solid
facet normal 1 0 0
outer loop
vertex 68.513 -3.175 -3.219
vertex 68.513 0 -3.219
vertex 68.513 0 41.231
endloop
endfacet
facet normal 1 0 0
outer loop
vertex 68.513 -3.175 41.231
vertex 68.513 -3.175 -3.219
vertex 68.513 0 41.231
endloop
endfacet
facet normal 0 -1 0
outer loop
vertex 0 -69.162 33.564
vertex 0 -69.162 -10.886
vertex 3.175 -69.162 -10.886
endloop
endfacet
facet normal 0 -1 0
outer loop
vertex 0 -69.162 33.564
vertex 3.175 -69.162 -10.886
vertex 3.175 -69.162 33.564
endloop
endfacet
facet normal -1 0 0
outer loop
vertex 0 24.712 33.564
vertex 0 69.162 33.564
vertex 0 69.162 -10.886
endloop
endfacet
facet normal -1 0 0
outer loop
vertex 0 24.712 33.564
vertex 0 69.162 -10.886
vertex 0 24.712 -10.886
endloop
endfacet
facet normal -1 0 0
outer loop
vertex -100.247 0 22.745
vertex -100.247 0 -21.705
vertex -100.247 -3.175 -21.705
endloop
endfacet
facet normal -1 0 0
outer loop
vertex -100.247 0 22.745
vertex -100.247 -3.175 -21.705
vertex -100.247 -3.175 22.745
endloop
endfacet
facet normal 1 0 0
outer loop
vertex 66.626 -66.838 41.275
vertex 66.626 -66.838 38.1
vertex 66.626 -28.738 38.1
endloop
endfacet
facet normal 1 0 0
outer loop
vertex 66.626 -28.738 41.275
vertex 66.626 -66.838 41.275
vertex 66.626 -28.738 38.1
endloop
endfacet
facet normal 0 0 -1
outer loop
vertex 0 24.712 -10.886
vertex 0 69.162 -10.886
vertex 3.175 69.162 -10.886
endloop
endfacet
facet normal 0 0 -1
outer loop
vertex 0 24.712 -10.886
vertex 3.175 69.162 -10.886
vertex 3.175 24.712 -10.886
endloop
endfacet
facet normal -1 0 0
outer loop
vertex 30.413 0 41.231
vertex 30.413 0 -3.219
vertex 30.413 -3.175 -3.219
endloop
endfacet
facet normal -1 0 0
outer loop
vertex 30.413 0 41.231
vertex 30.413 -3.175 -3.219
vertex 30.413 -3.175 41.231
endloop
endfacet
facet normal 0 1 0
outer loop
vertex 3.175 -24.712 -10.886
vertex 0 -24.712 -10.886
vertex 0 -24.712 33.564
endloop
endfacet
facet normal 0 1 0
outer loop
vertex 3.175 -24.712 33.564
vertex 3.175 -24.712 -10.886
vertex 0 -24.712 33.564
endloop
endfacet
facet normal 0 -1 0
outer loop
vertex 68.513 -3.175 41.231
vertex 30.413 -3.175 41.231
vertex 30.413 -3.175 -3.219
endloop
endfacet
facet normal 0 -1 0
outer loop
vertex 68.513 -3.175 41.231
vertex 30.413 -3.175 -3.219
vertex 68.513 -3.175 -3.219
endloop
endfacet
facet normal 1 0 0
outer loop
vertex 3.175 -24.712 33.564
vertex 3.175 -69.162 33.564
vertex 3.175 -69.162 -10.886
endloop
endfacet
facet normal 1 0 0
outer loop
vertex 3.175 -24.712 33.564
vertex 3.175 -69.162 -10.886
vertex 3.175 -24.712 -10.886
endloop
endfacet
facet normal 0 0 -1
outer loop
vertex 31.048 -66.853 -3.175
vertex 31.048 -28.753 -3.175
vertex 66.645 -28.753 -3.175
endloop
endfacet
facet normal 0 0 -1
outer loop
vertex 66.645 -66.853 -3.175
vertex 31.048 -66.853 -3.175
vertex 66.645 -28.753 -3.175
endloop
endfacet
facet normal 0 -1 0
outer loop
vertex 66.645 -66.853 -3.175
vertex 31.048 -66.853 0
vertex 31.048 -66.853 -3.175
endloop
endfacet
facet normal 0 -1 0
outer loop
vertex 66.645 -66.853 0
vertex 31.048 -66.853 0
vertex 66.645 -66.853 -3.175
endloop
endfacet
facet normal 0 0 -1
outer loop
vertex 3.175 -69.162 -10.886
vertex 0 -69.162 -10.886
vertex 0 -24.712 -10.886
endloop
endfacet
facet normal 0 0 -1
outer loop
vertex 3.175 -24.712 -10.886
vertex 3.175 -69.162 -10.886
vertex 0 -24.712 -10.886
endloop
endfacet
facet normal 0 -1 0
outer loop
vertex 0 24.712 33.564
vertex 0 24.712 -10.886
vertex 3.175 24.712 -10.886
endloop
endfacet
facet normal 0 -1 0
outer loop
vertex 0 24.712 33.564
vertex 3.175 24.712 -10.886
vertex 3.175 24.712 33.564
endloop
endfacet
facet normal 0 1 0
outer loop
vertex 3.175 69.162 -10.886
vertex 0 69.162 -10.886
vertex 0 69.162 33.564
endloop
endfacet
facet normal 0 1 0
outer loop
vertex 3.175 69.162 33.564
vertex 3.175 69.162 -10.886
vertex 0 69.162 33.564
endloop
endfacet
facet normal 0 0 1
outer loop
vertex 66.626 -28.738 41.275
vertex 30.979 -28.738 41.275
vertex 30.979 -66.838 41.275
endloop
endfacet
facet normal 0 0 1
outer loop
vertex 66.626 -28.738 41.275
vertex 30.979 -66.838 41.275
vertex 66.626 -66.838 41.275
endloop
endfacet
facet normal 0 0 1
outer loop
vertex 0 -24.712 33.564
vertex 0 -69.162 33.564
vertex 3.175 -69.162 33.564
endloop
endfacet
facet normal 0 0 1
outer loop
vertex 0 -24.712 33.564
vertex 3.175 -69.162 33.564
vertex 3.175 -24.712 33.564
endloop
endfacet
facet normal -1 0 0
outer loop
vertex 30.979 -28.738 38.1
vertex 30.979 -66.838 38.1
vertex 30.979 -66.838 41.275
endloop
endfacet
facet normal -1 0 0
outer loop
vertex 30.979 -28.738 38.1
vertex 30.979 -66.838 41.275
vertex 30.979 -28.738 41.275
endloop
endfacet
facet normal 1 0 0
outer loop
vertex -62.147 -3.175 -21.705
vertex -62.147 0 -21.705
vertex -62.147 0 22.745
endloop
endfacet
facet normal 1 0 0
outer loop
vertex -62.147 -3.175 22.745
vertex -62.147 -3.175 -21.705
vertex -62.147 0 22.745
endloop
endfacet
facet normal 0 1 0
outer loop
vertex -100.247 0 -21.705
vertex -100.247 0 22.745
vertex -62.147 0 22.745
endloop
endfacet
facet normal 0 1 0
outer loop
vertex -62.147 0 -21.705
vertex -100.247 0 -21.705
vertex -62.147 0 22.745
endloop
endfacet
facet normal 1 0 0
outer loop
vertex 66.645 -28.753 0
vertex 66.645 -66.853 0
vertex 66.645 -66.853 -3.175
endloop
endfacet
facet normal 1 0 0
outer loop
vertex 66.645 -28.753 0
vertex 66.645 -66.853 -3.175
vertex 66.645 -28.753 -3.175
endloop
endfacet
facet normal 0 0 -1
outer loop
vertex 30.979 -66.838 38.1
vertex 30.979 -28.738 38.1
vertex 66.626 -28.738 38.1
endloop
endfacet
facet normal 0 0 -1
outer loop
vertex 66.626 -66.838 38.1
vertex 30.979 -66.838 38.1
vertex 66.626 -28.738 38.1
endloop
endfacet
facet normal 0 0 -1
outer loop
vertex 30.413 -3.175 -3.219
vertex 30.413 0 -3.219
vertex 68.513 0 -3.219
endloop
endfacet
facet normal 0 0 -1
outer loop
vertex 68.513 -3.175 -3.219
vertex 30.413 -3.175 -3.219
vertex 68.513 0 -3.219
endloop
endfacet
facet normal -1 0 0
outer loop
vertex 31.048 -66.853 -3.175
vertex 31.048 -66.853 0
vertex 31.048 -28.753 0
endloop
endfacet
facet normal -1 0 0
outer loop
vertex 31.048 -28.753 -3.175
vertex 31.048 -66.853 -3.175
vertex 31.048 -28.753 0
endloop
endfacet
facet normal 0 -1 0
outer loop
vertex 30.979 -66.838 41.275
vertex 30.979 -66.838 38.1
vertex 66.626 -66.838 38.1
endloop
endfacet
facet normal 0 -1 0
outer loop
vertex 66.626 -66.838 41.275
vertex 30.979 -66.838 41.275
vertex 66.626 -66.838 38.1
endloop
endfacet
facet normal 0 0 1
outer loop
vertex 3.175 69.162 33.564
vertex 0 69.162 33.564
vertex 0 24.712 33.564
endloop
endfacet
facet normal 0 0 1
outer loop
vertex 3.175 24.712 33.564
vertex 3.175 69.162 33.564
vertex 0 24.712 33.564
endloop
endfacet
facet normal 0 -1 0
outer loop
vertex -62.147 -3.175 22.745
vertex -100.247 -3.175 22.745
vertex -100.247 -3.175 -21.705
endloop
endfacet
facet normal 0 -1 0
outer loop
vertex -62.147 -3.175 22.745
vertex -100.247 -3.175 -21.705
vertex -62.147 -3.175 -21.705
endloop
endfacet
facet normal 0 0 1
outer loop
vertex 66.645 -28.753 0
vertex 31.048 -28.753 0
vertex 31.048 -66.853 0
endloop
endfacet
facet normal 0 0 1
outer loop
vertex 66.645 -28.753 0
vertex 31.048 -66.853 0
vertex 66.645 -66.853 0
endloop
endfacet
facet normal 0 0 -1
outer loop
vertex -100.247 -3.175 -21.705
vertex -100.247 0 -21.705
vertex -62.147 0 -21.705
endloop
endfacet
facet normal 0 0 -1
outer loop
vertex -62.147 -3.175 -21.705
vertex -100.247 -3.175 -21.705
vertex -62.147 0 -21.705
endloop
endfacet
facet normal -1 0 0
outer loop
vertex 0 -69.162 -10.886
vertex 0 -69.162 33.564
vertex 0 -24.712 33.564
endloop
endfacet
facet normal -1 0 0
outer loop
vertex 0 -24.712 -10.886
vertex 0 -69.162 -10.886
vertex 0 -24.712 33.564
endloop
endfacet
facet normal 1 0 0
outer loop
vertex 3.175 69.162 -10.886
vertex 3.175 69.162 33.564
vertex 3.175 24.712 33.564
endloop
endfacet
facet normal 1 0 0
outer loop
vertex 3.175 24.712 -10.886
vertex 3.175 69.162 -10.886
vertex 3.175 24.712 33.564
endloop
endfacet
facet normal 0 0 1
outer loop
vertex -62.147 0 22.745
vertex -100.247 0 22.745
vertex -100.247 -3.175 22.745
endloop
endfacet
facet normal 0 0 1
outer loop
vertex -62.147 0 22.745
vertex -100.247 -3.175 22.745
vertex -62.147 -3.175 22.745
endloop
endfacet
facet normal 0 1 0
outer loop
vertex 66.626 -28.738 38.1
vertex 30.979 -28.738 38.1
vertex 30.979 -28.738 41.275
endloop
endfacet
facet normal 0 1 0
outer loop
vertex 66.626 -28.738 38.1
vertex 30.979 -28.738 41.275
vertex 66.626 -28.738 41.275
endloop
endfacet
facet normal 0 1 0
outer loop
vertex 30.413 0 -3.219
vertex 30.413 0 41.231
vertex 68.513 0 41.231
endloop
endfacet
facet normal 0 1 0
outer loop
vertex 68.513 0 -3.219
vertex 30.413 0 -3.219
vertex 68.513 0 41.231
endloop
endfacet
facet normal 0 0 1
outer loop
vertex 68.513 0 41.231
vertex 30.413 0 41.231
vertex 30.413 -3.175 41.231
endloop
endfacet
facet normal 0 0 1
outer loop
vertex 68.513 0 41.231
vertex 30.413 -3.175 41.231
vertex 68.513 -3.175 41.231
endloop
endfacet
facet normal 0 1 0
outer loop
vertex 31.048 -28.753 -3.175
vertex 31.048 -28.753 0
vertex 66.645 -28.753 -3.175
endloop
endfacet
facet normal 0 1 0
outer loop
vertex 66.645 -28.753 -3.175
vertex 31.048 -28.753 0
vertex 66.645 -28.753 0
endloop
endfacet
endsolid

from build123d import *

# Parameters (mm, degrees)
F2_W      = 35.646983982
F2_H      = 38.1
F3_DEPTH  = 3.175
F0_W      = 35.5965135368
F0_H      = 38.1
F4_DEPTH  = 3.175
F5_W      = 38.1
F5_H      = 44.45
F6_DEPTH  = 3.175
F7_W      = 44.45
F7_H      = 44.45
F8_DEPTH  = 3.175
F9_W      = 38.1
F9_H      = 44.45
F10_DEPTH = 3.175


with BuildPart() as f3:
    # F2 (on offset) → F3 (new body)
    with BuildSketch(Plane.XY.offset(38.1)):
        with Locations((48.8022370264, -47.7876216173)):
            Rectangle(F2_W, F2_H)
    extrude(amount=F3_DEPTH)


with BuildPart() as f4:
    # F0 (on Top) → F4 (new body)
    with BuildSketch(Plane.XY):
        with Locations((48.8464357331, -47.8029837832)):
            Rectangle(F0_W, F0_H)
    extrude(amount=-F4_DEPTH)


with BuildPart() as f6:
    # F5 (on Front) → F6 (new body)
    with BuildSketch(Plane.XZ):
        with Locations((49.4625122527, 19.0064050257)):
            Rectangle(F5_W, F5_H)
    extrude(amount=F6_DEPTH)


with BuildPart() as f8:
    # F7 (on Right) → F8 (new body)
    with BuildSketch(Plane.YZ):
        with Locations((-46.9369307002, 11.3389967009)):
            Rectangle(F7_W, F7_H)
    extrude(amount=F8_DEPTH)


with BuildPart() as f10:
    # F9 (on Front) → F10 (new body)
    with BuildSketch(Plane.XZ):
        with Locations((-81.197341904, 0.5202181637)):
            Rectangle(F9_W, F9_H)
    extrude(amount=F10_DEPTH)


with BuildPart() as f11_1:
    # F11: instance of F8
    add(f8.part.mirror(Plane.XZ))


solid = Compound([f3.part, f4.part, f6.part, f8.part, f10.part, f11_1.part])
